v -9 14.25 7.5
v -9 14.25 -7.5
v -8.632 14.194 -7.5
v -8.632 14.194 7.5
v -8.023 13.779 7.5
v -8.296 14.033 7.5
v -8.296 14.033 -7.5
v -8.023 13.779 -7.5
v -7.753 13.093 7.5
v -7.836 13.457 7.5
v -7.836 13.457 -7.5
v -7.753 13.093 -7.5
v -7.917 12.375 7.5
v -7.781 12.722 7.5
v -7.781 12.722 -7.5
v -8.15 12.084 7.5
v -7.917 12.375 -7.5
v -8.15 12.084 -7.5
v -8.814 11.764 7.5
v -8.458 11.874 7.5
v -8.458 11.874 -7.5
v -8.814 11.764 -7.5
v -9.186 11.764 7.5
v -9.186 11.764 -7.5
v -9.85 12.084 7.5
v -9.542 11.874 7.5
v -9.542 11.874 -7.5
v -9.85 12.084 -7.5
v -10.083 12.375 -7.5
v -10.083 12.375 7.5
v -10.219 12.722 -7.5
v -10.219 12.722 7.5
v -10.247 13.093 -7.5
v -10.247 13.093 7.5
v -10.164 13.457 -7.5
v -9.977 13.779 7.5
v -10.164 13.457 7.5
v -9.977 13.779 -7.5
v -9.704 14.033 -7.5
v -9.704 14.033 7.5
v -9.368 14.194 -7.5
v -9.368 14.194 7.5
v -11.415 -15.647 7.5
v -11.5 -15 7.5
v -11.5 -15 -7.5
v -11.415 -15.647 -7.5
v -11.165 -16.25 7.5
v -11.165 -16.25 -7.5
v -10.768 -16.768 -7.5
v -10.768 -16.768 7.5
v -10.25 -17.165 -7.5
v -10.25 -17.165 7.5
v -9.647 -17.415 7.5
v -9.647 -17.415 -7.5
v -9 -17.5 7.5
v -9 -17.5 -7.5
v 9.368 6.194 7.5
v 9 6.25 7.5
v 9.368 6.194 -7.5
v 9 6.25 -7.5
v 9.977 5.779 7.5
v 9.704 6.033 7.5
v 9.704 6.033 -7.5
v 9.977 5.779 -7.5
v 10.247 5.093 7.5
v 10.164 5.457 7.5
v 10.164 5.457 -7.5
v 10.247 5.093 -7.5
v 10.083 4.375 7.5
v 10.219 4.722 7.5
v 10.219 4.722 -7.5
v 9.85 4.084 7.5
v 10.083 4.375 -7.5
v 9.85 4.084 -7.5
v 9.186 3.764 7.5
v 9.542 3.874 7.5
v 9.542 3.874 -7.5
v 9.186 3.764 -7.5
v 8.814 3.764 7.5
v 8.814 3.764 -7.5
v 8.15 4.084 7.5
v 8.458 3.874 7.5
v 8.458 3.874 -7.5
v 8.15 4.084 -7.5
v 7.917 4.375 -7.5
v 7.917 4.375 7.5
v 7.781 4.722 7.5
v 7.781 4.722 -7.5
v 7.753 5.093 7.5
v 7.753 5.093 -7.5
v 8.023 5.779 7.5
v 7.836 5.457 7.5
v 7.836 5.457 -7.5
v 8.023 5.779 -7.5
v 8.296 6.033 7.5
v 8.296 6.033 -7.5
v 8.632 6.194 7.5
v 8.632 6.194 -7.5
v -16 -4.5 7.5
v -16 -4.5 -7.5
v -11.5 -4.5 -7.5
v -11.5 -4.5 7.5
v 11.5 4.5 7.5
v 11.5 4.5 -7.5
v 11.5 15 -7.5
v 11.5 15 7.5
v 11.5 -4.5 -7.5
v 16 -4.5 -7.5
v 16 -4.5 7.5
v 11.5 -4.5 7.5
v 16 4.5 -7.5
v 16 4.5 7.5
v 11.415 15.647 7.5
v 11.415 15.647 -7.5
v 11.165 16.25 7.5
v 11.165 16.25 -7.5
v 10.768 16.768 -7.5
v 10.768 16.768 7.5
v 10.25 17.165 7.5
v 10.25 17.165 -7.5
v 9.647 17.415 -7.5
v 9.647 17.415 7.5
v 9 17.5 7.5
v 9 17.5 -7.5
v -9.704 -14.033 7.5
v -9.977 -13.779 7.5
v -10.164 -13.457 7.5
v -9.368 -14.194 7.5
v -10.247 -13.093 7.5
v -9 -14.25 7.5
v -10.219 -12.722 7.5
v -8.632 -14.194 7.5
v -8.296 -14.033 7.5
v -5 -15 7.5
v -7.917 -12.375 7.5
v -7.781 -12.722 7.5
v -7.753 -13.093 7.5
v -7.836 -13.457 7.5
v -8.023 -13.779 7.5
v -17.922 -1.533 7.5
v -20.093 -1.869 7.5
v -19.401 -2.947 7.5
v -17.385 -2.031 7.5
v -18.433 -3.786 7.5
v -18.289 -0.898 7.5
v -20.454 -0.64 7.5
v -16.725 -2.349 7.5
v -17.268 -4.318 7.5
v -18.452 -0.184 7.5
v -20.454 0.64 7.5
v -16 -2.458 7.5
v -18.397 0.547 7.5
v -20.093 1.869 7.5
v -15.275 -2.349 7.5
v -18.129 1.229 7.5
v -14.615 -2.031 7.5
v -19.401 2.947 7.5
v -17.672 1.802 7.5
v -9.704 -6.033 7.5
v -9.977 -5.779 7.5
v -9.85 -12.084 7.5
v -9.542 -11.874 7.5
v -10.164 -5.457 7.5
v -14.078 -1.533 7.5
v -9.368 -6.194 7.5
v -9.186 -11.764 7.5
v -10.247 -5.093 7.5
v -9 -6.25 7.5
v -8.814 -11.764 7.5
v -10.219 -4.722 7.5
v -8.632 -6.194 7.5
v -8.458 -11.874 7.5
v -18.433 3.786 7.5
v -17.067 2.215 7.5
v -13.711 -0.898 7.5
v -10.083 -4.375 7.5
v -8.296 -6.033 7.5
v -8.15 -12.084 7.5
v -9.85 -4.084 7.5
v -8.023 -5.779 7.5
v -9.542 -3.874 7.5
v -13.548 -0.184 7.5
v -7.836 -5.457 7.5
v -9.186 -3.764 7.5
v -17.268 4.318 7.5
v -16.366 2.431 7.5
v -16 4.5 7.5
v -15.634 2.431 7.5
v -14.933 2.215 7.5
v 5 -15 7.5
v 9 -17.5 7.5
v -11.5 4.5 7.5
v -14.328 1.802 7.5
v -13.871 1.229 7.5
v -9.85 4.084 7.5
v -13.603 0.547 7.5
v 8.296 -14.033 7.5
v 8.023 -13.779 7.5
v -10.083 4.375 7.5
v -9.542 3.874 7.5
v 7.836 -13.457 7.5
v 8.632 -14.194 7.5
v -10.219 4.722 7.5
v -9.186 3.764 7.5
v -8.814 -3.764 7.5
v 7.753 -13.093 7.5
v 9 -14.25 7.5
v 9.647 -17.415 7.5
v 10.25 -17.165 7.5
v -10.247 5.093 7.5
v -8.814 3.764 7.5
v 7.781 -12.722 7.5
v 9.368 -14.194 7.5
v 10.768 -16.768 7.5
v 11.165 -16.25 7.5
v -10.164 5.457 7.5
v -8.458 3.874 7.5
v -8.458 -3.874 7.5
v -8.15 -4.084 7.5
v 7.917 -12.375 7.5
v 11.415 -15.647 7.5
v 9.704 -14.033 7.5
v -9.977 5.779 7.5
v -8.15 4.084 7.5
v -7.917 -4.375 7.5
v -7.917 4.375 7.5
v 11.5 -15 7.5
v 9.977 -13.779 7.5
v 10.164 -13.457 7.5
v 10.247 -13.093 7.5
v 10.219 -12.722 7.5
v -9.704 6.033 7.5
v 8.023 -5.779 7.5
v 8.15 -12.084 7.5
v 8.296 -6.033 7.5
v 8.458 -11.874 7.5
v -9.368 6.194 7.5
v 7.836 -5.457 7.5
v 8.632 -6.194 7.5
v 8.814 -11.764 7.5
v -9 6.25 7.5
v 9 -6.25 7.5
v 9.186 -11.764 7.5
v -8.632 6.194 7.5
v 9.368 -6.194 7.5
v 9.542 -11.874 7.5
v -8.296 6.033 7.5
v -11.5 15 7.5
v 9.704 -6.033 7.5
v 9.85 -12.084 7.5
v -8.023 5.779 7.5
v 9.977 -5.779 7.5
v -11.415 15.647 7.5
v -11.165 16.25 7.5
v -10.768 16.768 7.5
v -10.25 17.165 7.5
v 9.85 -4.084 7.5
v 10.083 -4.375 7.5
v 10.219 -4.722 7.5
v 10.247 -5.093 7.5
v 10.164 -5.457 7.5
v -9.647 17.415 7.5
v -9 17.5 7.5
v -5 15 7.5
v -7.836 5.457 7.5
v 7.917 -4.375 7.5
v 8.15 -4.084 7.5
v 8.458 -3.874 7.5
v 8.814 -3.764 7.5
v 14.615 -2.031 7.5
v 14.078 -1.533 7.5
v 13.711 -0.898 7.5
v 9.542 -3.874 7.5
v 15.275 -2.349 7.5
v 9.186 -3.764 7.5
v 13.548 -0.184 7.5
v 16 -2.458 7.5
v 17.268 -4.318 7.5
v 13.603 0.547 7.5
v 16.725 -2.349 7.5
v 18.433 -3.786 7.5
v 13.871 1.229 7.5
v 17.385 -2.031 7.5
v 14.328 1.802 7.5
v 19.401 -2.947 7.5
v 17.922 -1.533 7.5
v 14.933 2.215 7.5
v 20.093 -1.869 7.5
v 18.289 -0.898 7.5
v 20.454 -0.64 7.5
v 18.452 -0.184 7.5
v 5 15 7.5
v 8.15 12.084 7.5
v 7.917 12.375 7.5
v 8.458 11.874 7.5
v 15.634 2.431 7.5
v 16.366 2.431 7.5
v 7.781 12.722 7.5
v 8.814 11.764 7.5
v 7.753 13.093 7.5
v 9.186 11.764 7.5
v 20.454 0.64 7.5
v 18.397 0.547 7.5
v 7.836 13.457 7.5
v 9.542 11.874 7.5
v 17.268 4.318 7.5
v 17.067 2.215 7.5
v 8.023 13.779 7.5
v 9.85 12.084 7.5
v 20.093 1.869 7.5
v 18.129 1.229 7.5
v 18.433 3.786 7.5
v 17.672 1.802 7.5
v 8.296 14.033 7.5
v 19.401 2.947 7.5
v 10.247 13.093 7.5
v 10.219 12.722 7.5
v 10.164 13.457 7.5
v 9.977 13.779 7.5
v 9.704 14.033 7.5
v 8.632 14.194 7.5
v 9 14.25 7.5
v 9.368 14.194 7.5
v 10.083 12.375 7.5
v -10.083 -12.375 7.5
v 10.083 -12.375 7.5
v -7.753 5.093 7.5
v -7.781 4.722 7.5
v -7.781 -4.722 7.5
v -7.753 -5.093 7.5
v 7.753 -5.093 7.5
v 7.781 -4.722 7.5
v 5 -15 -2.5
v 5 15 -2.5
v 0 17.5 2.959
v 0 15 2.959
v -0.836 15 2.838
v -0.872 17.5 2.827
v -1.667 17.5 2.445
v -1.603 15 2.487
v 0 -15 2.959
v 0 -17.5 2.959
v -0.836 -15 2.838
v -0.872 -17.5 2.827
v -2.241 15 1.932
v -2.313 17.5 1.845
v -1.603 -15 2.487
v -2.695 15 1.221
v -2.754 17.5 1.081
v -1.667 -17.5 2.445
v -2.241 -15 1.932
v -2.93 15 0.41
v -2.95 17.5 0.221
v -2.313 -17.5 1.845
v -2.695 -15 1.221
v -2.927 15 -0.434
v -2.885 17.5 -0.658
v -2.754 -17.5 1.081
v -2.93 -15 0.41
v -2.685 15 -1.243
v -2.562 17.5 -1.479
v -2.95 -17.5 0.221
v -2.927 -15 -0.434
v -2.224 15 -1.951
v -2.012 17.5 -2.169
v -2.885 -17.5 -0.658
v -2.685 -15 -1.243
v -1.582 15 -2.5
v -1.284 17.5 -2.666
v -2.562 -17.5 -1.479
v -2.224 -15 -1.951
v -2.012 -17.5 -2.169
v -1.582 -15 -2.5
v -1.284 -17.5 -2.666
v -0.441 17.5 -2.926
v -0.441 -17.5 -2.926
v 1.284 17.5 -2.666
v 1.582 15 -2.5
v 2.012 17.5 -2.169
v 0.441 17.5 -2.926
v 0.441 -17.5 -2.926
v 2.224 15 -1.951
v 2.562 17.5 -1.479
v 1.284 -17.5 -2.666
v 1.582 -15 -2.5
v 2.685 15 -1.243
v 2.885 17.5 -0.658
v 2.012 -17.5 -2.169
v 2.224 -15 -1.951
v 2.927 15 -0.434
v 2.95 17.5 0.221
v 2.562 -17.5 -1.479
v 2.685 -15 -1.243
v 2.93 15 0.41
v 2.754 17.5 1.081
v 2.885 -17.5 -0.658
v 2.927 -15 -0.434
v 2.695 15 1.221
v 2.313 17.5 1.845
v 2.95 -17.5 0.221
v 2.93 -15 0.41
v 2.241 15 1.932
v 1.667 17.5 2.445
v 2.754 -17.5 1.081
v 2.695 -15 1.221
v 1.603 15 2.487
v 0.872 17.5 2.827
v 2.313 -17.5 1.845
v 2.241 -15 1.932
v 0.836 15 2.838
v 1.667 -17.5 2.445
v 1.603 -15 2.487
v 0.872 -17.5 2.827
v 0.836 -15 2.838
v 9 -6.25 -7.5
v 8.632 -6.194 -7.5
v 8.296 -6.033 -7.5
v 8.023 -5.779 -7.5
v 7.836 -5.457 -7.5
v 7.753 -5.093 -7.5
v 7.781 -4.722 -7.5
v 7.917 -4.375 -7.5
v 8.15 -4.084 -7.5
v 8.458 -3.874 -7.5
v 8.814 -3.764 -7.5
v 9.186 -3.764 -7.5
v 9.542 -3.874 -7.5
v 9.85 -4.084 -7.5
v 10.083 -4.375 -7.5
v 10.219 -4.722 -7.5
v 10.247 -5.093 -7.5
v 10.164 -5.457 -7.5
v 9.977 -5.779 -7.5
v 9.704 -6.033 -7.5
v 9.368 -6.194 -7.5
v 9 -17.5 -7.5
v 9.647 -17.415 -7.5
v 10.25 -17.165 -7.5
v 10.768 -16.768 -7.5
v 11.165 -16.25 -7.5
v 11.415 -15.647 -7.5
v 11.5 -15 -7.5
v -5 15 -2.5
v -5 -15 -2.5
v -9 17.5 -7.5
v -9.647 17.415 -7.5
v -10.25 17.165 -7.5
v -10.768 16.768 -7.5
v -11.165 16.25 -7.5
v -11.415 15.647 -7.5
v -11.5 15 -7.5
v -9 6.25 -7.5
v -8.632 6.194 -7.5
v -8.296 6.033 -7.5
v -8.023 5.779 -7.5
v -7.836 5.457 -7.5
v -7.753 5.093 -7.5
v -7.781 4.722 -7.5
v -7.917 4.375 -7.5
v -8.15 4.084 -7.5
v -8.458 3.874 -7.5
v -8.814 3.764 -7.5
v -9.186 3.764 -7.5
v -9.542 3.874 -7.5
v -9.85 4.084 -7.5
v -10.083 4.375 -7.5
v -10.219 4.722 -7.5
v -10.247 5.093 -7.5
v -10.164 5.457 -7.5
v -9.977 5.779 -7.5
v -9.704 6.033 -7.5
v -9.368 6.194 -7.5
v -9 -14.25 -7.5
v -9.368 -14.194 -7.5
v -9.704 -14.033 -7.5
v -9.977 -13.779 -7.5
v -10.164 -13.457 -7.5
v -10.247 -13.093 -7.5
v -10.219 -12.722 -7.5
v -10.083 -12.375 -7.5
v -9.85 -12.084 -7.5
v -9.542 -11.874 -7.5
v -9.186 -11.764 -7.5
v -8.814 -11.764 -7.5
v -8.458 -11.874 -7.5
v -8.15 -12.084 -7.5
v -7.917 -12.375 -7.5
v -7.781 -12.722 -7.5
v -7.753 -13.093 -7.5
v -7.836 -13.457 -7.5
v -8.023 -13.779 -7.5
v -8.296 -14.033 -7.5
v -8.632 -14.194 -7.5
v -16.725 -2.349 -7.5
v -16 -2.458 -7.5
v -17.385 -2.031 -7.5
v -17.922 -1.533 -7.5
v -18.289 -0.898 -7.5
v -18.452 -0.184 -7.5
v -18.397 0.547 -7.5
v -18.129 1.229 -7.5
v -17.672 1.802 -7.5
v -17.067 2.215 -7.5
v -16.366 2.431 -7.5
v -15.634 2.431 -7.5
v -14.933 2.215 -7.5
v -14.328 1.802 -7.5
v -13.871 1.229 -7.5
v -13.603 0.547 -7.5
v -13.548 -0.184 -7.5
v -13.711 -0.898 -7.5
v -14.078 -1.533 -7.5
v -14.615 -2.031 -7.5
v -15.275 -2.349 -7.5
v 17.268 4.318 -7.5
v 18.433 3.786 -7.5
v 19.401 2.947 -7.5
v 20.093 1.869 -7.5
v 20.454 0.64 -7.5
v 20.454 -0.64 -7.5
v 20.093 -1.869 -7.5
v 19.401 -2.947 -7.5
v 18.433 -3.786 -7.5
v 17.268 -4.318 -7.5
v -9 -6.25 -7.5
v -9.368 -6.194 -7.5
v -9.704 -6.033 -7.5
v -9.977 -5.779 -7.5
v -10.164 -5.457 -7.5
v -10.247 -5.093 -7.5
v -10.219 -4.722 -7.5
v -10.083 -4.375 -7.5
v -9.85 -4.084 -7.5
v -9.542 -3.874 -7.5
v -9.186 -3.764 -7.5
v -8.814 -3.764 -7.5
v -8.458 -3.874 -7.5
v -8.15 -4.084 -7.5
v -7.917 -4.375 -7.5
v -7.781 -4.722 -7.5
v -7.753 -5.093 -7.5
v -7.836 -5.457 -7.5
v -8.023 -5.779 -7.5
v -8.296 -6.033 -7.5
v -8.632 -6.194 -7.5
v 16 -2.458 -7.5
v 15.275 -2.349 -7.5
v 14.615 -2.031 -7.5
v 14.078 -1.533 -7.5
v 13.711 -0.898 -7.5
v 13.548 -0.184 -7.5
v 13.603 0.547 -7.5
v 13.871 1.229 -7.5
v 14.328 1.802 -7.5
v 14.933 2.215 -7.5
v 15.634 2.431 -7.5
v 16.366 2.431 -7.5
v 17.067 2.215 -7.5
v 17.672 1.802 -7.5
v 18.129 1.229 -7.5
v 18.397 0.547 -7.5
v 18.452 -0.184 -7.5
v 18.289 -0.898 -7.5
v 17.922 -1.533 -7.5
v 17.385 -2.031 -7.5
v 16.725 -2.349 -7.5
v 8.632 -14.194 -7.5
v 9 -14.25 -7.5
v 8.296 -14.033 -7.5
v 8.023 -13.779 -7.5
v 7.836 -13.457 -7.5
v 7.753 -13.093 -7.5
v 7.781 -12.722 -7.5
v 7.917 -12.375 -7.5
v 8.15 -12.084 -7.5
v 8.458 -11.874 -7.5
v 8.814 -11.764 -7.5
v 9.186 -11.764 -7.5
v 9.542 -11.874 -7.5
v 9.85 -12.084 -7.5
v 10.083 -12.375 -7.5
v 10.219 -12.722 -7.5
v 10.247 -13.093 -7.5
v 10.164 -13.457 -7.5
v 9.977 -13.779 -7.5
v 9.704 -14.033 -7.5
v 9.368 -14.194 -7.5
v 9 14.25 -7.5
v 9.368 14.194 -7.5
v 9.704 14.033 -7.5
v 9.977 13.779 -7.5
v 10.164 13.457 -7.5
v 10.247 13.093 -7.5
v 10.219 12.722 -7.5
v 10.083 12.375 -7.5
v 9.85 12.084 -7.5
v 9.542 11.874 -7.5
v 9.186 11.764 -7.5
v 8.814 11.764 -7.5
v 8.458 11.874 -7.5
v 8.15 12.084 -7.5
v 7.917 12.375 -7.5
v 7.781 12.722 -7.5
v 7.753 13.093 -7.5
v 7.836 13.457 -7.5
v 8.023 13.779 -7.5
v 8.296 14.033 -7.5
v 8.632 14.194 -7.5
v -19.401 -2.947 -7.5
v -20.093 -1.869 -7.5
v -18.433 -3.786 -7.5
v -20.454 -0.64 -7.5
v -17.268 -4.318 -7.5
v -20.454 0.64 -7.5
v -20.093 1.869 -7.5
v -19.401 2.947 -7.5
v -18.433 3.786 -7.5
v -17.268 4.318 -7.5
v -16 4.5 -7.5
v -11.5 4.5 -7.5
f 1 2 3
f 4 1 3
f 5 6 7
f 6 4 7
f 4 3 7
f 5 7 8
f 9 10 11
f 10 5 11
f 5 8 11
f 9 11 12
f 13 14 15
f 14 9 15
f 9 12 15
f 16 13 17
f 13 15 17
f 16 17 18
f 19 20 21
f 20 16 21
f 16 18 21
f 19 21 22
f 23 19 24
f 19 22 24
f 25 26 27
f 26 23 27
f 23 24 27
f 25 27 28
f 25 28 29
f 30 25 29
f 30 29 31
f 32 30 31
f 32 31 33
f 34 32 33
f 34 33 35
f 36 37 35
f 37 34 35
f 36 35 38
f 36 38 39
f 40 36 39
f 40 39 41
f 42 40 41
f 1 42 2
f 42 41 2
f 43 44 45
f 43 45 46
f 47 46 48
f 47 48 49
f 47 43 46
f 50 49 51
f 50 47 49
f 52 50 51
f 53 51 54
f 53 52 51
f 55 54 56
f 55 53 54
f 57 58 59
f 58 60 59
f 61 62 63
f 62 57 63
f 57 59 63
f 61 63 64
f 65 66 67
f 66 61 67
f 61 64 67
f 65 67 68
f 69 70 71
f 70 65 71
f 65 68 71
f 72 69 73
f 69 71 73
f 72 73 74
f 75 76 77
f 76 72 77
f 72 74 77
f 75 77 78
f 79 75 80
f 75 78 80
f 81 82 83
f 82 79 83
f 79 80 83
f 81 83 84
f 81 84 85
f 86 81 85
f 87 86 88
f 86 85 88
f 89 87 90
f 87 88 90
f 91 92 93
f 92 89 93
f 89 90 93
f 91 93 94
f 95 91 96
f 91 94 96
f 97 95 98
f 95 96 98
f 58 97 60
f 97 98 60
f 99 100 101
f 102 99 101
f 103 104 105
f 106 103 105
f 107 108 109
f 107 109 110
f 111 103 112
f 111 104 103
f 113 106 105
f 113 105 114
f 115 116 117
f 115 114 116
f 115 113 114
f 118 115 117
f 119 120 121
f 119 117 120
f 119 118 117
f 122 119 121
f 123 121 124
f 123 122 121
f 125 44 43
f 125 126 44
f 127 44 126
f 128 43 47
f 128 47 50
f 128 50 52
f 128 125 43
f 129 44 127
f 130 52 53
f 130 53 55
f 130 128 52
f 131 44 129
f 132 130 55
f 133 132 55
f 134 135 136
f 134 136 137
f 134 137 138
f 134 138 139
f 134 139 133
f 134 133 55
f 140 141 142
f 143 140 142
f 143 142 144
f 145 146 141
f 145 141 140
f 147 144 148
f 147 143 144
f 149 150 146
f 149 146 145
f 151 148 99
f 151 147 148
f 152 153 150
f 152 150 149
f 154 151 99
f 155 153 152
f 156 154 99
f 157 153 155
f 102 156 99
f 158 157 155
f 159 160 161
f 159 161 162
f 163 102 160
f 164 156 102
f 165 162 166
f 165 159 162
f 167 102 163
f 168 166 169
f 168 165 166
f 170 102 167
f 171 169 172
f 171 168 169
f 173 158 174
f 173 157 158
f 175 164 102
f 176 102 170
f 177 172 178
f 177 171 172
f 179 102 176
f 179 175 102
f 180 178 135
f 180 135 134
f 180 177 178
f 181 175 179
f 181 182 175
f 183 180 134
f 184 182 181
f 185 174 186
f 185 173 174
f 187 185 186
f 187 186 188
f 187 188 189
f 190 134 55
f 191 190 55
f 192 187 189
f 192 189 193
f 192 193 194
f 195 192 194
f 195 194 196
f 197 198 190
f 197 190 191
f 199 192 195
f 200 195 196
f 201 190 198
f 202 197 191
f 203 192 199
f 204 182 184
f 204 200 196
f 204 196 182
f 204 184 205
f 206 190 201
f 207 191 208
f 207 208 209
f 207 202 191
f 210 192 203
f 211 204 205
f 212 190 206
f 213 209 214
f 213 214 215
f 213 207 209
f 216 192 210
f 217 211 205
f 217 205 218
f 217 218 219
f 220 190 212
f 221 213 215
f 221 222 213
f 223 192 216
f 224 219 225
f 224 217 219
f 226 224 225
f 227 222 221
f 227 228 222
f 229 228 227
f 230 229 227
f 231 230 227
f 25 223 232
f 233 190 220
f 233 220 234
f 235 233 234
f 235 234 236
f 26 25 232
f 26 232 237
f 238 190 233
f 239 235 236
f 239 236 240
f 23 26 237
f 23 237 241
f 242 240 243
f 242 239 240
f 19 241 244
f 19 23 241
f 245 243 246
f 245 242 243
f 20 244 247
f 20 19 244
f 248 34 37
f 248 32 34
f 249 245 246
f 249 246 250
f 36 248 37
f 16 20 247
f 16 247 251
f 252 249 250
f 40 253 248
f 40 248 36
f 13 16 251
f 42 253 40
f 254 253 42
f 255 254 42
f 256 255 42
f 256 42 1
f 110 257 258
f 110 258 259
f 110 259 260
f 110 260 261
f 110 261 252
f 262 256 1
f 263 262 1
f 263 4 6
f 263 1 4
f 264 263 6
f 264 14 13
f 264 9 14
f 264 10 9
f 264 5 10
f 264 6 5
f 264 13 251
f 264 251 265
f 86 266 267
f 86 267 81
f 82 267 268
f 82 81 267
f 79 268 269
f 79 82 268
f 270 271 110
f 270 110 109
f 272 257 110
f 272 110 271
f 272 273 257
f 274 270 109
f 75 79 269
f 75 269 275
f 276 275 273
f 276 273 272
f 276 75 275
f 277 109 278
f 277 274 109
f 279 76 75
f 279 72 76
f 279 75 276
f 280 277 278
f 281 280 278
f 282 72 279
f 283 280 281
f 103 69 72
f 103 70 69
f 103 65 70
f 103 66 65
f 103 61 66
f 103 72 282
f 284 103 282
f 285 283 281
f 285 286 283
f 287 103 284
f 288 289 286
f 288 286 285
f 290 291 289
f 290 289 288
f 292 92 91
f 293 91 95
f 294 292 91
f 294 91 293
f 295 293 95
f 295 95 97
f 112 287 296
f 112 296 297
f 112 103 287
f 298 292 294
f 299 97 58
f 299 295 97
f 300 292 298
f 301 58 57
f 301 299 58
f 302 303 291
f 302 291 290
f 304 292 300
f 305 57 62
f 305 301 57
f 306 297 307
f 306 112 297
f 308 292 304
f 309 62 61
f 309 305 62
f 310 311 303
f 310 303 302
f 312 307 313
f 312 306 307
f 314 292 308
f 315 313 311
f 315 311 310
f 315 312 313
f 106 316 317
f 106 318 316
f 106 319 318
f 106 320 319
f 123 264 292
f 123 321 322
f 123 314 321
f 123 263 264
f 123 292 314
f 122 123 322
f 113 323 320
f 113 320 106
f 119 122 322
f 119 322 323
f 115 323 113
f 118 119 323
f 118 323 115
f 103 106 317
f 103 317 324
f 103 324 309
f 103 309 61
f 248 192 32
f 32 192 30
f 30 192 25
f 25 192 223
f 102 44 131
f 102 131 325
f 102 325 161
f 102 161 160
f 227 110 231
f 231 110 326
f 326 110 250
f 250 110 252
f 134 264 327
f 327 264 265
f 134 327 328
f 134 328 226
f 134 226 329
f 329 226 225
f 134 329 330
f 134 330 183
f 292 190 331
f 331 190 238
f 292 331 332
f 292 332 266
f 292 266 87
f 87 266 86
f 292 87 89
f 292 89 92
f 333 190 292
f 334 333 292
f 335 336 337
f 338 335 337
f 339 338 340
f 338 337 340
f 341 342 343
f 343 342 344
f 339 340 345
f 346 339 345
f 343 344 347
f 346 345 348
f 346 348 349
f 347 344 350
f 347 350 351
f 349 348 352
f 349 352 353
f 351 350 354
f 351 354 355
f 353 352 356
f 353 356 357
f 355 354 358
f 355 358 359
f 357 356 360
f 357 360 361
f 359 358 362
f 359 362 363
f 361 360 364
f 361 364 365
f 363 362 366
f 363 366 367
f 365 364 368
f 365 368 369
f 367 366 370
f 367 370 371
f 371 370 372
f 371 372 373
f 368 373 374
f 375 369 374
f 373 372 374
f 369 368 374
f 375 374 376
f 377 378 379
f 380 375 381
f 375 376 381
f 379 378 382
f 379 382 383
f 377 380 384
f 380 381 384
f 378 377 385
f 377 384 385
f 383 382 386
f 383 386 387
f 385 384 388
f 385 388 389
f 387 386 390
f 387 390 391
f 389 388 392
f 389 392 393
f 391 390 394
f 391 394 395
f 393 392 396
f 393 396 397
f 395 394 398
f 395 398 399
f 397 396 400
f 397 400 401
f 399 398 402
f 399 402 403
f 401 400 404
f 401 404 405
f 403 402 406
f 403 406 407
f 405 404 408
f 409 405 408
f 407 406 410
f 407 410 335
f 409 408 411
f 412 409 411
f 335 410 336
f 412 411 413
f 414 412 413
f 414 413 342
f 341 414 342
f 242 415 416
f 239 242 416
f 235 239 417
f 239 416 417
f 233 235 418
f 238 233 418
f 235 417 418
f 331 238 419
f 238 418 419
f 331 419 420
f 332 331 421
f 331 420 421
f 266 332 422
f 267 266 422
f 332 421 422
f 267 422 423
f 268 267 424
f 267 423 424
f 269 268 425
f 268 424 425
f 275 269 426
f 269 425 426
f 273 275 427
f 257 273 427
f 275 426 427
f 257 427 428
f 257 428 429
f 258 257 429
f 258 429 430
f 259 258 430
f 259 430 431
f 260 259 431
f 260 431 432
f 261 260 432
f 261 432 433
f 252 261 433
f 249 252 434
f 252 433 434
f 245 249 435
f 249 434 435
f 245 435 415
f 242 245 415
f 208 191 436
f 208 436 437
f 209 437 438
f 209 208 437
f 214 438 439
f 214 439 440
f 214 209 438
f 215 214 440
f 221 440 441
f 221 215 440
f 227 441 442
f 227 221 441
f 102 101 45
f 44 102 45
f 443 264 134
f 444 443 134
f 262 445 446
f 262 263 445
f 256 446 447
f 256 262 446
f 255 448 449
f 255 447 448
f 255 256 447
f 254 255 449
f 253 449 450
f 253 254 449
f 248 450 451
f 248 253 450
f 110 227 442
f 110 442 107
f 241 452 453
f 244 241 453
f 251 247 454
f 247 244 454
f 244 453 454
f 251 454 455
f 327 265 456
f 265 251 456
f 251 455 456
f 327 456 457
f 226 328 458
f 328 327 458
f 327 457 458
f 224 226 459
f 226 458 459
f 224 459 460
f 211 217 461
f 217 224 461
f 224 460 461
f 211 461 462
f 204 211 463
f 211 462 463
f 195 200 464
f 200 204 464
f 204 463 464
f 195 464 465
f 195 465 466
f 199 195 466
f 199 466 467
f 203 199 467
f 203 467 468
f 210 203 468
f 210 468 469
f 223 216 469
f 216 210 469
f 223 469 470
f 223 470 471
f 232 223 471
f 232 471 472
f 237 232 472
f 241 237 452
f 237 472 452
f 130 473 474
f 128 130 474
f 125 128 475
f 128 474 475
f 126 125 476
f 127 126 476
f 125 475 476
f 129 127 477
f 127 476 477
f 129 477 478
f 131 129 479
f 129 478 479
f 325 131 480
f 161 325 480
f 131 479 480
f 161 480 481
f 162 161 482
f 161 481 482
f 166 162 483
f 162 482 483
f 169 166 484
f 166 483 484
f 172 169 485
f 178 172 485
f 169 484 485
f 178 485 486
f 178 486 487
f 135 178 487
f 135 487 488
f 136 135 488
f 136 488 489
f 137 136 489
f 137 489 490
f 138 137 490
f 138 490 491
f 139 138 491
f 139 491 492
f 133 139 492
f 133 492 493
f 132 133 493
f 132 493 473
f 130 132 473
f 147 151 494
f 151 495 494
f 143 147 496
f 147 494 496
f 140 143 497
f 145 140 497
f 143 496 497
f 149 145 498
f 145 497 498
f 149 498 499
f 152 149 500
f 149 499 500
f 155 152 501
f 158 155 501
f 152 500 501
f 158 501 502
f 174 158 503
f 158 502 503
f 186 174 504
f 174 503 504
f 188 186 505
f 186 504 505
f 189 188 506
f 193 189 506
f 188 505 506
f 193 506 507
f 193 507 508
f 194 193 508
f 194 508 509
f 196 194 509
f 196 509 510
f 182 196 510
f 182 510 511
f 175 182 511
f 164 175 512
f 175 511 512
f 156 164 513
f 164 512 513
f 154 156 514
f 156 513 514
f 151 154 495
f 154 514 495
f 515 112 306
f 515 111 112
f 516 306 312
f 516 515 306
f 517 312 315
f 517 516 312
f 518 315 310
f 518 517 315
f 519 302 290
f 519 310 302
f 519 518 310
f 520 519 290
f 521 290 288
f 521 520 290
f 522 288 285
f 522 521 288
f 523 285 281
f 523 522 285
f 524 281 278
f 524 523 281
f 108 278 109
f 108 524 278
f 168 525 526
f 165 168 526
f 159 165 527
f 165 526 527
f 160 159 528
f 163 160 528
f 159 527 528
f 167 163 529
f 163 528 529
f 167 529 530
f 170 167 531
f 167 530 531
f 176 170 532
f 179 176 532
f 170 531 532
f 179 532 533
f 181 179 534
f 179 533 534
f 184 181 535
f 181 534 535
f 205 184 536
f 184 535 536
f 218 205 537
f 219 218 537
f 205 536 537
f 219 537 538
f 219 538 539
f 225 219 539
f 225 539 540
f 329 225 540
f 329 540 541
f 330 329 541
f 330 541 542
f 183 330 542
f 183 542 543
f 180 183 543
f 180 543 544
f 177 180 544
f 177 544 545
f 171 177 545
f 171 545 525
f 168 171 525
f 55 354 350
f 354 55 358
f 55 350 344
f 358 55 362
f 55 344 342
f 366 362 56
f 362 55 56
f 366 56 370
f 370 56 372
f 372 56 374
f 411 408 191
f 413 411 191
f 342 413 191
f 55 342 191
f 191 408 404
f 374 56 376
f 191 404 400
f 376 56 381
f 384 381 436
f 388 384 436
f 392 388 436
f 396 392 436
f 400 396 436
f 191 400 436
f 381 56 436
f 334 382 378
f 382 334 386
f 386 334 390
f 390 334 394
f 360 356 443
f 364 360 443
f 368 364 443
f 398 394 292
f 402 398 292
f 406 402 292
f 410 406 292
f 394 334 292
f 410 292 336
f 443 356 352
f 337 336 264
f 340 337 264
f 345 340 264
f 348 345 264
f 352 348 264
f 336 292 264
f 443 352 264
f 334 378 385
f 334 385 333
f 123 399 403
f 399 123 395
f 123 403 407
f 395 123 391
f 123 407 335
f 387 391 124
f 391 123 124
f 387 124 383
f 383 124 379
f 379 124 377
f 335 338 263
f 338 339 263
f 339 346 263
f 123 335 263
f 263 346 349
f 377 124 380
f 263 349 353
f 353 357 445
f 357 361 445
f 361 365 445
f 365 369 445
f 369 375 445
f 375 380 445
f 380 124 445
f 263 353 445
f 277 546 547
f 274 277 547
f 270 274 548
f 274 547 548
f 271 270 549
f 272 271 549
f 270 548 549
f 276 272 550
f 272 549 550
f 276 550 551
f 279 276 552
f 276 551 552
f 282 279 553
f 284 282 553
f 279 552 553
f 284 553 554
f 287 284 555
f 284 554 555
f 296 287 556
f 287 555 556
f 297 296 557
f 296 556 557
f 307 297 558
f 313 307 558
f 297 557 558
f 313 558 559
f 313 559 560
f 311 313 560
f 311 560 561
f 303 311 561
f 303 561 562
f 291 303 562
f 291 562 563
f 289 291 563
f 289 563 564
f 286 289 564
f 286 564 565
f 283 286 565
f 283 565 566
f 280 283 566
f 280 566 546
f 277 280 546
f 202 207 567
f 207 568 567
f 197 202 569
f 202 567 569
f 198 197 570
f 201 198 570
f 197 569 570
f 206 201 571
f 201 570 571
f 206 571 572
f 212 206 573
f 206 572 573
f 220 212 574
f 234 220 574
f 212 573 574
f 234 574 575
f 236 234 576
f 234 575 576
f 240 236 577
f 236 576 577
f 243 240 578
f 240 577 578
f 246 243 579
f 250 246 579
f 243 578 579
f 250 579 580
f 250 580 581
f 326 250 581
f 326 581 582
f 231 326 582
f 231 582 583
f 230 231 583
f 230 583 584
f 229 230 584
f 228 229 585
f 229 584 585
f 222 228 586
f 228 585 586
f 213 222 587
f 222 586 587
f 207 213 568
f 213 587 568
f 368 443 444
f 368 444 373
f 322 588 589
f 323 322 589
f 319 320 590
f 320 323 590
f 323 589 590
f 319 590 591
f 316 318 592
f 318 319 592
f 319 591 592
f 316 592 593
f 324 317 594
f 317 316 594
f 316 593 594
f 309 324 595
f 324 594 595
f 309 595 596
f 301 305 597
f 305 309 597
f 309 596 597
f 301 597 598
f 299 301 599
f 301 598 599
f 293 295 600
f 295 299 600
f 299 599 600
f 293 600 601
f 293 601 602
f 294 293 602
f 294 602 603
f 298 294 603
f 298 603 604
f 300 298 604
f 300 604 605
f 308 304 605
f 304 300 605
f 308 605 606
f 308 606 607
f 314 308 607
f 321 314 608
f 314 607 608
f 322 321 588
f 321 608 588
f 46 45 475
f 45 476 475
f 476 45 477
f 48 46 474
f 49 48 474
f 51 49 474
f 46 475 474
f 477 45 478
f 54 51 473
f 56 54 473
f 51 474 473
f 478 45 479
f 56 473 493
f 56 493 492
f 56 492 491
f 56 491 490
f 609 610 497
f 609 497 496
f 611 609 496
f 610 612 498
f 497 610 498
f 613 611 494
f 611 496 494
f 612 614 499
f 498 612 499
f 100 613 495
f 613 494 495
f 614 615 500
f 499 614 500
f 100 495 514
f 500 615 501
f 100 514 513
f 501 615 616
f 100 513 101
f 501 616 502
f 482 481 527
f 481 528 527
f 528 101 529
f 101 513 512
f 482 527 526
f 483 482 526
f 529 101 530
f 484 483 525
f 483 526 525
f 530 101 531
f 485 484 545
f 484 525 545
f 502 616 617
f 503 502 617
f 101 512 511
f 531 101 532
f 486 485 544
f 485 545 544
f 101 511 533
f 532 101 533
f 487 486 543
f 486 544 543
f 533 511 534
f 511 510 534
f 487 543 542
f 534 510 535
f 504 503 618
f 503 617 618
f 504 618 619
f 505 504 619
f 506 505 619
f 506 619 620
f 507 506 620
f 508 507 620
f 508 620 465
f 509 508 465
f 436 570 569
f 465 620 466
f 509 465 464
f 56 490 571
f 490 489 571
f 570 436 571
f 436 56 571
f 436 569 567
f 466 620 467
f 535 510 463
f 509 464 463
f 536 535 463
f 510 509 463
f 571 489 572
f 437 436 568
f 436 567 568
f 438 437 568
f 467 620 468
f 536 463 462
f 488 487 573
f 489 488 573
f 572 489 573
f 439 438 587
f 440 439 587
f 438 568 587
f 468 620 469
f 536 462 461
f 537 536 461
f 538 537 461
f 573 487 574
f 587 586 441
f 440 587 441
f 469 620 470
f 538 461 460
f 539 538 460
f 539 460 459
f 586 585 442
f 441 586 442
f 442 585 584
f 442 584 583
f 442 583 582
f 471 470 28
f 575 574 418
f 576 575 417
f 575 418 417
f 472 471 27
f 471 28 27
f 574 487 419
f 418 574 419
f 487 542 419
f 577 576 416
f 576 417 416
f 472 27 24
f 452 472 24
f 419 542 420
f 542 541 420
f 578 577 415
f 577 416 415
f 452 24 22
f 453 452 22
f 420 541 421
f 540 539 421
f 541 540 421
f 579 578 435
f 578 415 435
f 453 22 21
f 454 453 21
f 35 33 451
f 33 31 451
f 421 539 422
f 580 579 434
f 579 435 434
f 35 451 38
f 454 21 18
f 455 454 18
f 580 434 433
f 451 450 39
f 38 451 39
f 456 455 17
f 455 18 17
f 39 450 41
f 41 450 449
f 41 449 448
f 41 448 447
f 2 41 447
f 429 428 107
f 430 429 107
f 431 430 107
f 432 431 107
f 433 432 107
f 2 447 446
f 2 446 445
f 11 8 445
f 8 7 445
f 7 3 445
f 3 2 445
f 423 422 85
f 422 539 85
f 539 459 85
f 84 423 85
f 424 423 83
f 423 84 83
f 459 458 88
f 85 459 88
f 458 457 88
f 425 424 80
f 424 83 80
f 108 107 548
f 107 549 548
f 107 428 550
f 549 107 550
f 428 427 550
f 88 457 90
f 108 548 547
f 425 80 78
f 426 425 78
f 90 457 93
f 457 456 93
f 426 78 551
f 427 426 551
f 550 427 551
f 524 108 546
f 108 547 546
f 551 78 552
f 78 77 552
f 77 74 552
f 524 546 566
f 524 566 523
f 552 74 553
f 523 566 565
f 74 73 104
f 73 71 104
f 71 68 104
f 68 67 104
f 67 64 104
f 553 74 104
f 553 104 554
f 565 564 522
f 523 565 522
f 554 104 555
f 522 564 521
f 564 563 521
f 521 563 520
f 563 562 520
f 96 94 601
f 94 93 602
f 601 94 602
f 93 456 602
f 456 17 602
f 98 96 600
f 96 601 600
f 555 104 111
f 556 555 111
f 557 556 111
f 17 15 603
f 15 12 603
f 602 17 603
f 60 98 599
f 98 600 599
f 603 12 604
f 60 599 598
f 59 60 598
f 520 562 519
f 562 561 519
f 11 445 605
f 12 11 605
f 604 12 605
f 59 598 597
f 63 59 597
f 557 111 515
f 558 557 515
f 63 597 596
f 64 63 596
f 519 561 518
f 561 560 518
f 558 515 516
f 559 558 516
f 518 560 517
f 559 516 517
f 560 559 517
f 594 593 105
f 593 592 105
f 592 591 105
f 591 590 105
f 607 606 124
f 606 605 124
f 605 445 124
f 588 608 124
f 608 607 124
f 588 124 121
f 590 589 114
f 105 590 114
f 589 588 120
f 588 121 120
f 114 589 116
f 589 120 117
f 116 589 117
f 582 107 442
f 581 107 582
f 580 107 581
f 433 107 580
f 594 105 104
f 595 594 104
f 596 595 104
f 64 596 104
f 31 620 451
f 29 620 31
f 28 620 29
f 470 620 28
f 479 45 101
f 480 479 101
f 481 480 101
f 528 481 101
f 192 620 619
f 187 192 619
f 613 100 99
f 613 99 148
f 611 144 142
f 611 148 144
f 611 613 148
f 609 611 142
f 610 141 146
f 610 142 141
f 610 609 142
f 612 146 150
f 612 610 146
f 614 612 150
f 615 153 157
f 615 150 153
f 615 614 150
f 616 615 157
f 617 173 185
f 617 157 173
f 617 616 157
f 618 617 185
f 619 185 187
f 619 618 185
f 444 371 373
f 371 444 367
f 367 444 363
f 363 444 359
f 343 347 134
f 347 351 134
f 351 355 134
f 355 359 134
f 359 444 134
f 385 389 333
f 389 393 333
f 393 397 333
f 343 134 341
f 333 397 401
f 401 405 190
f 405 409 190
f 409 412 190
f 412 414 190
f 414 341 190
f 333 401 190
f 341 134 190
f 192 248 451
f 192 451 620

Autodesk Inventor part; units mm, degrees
ref_plane "YZ Plane" through (0, 0, 0) normal (1, 0, 0) x (0, 1, 0)
ref_plane "XZ Plane" through (0, 0, 0) normal (0, 1, 0) x (-1, 0, 0)
ref_plane "XY Plane" through (0, 0, 0) normal (0, 0, 1) x (1, 0, 0)
sketch "Sketch1" plane through (0, 0, 0) normal (0, 0, 1) x (1, 0, 0)
  line L0 (-11.5, -17.5) -> (11.5, -17.5)
  line L1 (11.5, -17.5) -> (11.5, 17.5)
  line L2 (11.5, 17.5) -> (-11.5, 17.5)
  line L3 (-11.5, 17.5) -> (-11.5, -17.5)
  line L4 (-11.5, -17.5) -> (11.5, 17.5) construction
  line L5 (11.5, -17.5) -> (-11.5, 17.5) construction
  line L6 (-11.5, 4.5) -> (-16, 4.5)
  line L7 (-20.5, 0) -> (-20.5, 0)
  line L8 (-16, -4.5) -> (-11.5, -4.5)
  line L9 (11.5, 4.5) -> (16, 4.5)
  line L10 (20.5, 0) -> (20.5, 0)
  line L11 (16, -4.5) -> (11.5, -4.5)
  arc A0 (16, -4.5) -> (20.5, 0) centre (16, 0) ccw
  arc A1 (20.5, 0) -> (16, 4.5) centre (16, 0) ccw
  arc A2 (-20.5, 0) -> (-16, -4.5) centre (-16, 0) ccw
  arc A3 (-16, 4.5) -> (-20.5, 0) centre (-16, 0) ccw
  point P0 (0, 0)
  point P1 (-20.5, 0)
  point P2 (-11.5, 0)
  point P3 (20.5, 0)
  point P4 (11.5, 0)
  point P5 (13.75, -4.5)
  point P6 (0, -17.5)
  point P7 (20.5, 0)
  dimension "d0" = 35
  dimension "d1" = 23
  dimension "d2" = 4.5
  dimension "d3" = 9
  dimension "d4" = 4.5
  dimension "d5" = 9
  dimension "d6" = 32
  dimension "d7" = 16
extrude "Extrusion1" add sketch "Sketch1" along normal mid plane 15
sketch "Sketch2" plane through (0, 0, 7.5) normal (0, 0, 1) x (1, 0, 0)
  arc A0 (-16, 4.5) -> (-16, -4.5) centre (-16, 0) ccw projected
  arc A1 (16, -4.5) -> (16, 4.5) centre (16, 0) ccw projected
  point P0 (0, 0)
  point P1 (-16, 0)
  point P2 (16, 0)
hole "Hole1" at (-16, 0, 7.5) at (16, 0, 7.5) direction (0, 0, -1) diameter 4.917 depth 15 thread size "M6x1" class "6H" standard "ISO Metric profile"
sketch "Sketch4" plane through (-11.5, 17.5, 7.5) normal (0, 1, 0) x (1, 0, 0)
  point P0 (11.5, 7.5)
  point P1 (11.5, 7.5)
hole "Hole2" at (0, 17.5, 0) direction (0, -1, 0) diameter 5.9175 end through all thread size "M7x1" class "6H" standard "ISO Metric profile"
sketch "Sketch3" plane through (0, 0, 7.5) normal (0, 0, 1) x (1, 0, 0)
  line L0 (-5, -15) -> (5, -15)
  line L1 (5, -15) -> (5, 15)
  line L2 (5, 15) -> (-5, 15)
  line L3 (-5, 15) -> (-5, -15)
  line L4 (-5, -15) -> (5, 15) construction
  line L5 (5, -15) -> (-5, 15) construction
  point P0 (0, 0)
  dimension "d17" = 10
  dimension "d18" = 30
extrude "Extrusion2" cut sketch "Sketch3" against normal blind 10
sketch "Sketch6" plane through (0, 0, 7.5) normal (0, 0, 1) x (1, 0, 0)
  line L0 (-11.5, -17.5) -> (11.5, -17.5) projected
  point P0 (0, 0)
  point P1 (-9, -13)
  point P2 (-9, -5)
  point P3 (9, -5)
  point P4 (9, -13)
  dimension "d31" = 8
  dimension "d42" = 5
  dimension "d43" = 18
  dimension "d44" = 9
hole "Hole3" at (-9, -13, 7.5) at (-9, -5, 7.5) at (9, -5, 7.5) at (9, -13, 7.5) direction (0, 0, -1) diameter 2.5 depth 15
mirror "Mirror1" about plane through (0, 0, 0) normal (0, 1, 0) of "Hole3"
fillet "Fillet1" radius 2.5 6 edges at (11.5, 17.5, 3.75) (11.5, 17.5, -3.75) (-11.5, 17.5, 3.75) (-11.5, 17.5, -3.75) (-11.5, -17.5, 0) (11.5, -17.5, 0)
equation "\"d5\" = d3"
equation "\"d7\" = 0.5 * d6"
properties part number "15"
